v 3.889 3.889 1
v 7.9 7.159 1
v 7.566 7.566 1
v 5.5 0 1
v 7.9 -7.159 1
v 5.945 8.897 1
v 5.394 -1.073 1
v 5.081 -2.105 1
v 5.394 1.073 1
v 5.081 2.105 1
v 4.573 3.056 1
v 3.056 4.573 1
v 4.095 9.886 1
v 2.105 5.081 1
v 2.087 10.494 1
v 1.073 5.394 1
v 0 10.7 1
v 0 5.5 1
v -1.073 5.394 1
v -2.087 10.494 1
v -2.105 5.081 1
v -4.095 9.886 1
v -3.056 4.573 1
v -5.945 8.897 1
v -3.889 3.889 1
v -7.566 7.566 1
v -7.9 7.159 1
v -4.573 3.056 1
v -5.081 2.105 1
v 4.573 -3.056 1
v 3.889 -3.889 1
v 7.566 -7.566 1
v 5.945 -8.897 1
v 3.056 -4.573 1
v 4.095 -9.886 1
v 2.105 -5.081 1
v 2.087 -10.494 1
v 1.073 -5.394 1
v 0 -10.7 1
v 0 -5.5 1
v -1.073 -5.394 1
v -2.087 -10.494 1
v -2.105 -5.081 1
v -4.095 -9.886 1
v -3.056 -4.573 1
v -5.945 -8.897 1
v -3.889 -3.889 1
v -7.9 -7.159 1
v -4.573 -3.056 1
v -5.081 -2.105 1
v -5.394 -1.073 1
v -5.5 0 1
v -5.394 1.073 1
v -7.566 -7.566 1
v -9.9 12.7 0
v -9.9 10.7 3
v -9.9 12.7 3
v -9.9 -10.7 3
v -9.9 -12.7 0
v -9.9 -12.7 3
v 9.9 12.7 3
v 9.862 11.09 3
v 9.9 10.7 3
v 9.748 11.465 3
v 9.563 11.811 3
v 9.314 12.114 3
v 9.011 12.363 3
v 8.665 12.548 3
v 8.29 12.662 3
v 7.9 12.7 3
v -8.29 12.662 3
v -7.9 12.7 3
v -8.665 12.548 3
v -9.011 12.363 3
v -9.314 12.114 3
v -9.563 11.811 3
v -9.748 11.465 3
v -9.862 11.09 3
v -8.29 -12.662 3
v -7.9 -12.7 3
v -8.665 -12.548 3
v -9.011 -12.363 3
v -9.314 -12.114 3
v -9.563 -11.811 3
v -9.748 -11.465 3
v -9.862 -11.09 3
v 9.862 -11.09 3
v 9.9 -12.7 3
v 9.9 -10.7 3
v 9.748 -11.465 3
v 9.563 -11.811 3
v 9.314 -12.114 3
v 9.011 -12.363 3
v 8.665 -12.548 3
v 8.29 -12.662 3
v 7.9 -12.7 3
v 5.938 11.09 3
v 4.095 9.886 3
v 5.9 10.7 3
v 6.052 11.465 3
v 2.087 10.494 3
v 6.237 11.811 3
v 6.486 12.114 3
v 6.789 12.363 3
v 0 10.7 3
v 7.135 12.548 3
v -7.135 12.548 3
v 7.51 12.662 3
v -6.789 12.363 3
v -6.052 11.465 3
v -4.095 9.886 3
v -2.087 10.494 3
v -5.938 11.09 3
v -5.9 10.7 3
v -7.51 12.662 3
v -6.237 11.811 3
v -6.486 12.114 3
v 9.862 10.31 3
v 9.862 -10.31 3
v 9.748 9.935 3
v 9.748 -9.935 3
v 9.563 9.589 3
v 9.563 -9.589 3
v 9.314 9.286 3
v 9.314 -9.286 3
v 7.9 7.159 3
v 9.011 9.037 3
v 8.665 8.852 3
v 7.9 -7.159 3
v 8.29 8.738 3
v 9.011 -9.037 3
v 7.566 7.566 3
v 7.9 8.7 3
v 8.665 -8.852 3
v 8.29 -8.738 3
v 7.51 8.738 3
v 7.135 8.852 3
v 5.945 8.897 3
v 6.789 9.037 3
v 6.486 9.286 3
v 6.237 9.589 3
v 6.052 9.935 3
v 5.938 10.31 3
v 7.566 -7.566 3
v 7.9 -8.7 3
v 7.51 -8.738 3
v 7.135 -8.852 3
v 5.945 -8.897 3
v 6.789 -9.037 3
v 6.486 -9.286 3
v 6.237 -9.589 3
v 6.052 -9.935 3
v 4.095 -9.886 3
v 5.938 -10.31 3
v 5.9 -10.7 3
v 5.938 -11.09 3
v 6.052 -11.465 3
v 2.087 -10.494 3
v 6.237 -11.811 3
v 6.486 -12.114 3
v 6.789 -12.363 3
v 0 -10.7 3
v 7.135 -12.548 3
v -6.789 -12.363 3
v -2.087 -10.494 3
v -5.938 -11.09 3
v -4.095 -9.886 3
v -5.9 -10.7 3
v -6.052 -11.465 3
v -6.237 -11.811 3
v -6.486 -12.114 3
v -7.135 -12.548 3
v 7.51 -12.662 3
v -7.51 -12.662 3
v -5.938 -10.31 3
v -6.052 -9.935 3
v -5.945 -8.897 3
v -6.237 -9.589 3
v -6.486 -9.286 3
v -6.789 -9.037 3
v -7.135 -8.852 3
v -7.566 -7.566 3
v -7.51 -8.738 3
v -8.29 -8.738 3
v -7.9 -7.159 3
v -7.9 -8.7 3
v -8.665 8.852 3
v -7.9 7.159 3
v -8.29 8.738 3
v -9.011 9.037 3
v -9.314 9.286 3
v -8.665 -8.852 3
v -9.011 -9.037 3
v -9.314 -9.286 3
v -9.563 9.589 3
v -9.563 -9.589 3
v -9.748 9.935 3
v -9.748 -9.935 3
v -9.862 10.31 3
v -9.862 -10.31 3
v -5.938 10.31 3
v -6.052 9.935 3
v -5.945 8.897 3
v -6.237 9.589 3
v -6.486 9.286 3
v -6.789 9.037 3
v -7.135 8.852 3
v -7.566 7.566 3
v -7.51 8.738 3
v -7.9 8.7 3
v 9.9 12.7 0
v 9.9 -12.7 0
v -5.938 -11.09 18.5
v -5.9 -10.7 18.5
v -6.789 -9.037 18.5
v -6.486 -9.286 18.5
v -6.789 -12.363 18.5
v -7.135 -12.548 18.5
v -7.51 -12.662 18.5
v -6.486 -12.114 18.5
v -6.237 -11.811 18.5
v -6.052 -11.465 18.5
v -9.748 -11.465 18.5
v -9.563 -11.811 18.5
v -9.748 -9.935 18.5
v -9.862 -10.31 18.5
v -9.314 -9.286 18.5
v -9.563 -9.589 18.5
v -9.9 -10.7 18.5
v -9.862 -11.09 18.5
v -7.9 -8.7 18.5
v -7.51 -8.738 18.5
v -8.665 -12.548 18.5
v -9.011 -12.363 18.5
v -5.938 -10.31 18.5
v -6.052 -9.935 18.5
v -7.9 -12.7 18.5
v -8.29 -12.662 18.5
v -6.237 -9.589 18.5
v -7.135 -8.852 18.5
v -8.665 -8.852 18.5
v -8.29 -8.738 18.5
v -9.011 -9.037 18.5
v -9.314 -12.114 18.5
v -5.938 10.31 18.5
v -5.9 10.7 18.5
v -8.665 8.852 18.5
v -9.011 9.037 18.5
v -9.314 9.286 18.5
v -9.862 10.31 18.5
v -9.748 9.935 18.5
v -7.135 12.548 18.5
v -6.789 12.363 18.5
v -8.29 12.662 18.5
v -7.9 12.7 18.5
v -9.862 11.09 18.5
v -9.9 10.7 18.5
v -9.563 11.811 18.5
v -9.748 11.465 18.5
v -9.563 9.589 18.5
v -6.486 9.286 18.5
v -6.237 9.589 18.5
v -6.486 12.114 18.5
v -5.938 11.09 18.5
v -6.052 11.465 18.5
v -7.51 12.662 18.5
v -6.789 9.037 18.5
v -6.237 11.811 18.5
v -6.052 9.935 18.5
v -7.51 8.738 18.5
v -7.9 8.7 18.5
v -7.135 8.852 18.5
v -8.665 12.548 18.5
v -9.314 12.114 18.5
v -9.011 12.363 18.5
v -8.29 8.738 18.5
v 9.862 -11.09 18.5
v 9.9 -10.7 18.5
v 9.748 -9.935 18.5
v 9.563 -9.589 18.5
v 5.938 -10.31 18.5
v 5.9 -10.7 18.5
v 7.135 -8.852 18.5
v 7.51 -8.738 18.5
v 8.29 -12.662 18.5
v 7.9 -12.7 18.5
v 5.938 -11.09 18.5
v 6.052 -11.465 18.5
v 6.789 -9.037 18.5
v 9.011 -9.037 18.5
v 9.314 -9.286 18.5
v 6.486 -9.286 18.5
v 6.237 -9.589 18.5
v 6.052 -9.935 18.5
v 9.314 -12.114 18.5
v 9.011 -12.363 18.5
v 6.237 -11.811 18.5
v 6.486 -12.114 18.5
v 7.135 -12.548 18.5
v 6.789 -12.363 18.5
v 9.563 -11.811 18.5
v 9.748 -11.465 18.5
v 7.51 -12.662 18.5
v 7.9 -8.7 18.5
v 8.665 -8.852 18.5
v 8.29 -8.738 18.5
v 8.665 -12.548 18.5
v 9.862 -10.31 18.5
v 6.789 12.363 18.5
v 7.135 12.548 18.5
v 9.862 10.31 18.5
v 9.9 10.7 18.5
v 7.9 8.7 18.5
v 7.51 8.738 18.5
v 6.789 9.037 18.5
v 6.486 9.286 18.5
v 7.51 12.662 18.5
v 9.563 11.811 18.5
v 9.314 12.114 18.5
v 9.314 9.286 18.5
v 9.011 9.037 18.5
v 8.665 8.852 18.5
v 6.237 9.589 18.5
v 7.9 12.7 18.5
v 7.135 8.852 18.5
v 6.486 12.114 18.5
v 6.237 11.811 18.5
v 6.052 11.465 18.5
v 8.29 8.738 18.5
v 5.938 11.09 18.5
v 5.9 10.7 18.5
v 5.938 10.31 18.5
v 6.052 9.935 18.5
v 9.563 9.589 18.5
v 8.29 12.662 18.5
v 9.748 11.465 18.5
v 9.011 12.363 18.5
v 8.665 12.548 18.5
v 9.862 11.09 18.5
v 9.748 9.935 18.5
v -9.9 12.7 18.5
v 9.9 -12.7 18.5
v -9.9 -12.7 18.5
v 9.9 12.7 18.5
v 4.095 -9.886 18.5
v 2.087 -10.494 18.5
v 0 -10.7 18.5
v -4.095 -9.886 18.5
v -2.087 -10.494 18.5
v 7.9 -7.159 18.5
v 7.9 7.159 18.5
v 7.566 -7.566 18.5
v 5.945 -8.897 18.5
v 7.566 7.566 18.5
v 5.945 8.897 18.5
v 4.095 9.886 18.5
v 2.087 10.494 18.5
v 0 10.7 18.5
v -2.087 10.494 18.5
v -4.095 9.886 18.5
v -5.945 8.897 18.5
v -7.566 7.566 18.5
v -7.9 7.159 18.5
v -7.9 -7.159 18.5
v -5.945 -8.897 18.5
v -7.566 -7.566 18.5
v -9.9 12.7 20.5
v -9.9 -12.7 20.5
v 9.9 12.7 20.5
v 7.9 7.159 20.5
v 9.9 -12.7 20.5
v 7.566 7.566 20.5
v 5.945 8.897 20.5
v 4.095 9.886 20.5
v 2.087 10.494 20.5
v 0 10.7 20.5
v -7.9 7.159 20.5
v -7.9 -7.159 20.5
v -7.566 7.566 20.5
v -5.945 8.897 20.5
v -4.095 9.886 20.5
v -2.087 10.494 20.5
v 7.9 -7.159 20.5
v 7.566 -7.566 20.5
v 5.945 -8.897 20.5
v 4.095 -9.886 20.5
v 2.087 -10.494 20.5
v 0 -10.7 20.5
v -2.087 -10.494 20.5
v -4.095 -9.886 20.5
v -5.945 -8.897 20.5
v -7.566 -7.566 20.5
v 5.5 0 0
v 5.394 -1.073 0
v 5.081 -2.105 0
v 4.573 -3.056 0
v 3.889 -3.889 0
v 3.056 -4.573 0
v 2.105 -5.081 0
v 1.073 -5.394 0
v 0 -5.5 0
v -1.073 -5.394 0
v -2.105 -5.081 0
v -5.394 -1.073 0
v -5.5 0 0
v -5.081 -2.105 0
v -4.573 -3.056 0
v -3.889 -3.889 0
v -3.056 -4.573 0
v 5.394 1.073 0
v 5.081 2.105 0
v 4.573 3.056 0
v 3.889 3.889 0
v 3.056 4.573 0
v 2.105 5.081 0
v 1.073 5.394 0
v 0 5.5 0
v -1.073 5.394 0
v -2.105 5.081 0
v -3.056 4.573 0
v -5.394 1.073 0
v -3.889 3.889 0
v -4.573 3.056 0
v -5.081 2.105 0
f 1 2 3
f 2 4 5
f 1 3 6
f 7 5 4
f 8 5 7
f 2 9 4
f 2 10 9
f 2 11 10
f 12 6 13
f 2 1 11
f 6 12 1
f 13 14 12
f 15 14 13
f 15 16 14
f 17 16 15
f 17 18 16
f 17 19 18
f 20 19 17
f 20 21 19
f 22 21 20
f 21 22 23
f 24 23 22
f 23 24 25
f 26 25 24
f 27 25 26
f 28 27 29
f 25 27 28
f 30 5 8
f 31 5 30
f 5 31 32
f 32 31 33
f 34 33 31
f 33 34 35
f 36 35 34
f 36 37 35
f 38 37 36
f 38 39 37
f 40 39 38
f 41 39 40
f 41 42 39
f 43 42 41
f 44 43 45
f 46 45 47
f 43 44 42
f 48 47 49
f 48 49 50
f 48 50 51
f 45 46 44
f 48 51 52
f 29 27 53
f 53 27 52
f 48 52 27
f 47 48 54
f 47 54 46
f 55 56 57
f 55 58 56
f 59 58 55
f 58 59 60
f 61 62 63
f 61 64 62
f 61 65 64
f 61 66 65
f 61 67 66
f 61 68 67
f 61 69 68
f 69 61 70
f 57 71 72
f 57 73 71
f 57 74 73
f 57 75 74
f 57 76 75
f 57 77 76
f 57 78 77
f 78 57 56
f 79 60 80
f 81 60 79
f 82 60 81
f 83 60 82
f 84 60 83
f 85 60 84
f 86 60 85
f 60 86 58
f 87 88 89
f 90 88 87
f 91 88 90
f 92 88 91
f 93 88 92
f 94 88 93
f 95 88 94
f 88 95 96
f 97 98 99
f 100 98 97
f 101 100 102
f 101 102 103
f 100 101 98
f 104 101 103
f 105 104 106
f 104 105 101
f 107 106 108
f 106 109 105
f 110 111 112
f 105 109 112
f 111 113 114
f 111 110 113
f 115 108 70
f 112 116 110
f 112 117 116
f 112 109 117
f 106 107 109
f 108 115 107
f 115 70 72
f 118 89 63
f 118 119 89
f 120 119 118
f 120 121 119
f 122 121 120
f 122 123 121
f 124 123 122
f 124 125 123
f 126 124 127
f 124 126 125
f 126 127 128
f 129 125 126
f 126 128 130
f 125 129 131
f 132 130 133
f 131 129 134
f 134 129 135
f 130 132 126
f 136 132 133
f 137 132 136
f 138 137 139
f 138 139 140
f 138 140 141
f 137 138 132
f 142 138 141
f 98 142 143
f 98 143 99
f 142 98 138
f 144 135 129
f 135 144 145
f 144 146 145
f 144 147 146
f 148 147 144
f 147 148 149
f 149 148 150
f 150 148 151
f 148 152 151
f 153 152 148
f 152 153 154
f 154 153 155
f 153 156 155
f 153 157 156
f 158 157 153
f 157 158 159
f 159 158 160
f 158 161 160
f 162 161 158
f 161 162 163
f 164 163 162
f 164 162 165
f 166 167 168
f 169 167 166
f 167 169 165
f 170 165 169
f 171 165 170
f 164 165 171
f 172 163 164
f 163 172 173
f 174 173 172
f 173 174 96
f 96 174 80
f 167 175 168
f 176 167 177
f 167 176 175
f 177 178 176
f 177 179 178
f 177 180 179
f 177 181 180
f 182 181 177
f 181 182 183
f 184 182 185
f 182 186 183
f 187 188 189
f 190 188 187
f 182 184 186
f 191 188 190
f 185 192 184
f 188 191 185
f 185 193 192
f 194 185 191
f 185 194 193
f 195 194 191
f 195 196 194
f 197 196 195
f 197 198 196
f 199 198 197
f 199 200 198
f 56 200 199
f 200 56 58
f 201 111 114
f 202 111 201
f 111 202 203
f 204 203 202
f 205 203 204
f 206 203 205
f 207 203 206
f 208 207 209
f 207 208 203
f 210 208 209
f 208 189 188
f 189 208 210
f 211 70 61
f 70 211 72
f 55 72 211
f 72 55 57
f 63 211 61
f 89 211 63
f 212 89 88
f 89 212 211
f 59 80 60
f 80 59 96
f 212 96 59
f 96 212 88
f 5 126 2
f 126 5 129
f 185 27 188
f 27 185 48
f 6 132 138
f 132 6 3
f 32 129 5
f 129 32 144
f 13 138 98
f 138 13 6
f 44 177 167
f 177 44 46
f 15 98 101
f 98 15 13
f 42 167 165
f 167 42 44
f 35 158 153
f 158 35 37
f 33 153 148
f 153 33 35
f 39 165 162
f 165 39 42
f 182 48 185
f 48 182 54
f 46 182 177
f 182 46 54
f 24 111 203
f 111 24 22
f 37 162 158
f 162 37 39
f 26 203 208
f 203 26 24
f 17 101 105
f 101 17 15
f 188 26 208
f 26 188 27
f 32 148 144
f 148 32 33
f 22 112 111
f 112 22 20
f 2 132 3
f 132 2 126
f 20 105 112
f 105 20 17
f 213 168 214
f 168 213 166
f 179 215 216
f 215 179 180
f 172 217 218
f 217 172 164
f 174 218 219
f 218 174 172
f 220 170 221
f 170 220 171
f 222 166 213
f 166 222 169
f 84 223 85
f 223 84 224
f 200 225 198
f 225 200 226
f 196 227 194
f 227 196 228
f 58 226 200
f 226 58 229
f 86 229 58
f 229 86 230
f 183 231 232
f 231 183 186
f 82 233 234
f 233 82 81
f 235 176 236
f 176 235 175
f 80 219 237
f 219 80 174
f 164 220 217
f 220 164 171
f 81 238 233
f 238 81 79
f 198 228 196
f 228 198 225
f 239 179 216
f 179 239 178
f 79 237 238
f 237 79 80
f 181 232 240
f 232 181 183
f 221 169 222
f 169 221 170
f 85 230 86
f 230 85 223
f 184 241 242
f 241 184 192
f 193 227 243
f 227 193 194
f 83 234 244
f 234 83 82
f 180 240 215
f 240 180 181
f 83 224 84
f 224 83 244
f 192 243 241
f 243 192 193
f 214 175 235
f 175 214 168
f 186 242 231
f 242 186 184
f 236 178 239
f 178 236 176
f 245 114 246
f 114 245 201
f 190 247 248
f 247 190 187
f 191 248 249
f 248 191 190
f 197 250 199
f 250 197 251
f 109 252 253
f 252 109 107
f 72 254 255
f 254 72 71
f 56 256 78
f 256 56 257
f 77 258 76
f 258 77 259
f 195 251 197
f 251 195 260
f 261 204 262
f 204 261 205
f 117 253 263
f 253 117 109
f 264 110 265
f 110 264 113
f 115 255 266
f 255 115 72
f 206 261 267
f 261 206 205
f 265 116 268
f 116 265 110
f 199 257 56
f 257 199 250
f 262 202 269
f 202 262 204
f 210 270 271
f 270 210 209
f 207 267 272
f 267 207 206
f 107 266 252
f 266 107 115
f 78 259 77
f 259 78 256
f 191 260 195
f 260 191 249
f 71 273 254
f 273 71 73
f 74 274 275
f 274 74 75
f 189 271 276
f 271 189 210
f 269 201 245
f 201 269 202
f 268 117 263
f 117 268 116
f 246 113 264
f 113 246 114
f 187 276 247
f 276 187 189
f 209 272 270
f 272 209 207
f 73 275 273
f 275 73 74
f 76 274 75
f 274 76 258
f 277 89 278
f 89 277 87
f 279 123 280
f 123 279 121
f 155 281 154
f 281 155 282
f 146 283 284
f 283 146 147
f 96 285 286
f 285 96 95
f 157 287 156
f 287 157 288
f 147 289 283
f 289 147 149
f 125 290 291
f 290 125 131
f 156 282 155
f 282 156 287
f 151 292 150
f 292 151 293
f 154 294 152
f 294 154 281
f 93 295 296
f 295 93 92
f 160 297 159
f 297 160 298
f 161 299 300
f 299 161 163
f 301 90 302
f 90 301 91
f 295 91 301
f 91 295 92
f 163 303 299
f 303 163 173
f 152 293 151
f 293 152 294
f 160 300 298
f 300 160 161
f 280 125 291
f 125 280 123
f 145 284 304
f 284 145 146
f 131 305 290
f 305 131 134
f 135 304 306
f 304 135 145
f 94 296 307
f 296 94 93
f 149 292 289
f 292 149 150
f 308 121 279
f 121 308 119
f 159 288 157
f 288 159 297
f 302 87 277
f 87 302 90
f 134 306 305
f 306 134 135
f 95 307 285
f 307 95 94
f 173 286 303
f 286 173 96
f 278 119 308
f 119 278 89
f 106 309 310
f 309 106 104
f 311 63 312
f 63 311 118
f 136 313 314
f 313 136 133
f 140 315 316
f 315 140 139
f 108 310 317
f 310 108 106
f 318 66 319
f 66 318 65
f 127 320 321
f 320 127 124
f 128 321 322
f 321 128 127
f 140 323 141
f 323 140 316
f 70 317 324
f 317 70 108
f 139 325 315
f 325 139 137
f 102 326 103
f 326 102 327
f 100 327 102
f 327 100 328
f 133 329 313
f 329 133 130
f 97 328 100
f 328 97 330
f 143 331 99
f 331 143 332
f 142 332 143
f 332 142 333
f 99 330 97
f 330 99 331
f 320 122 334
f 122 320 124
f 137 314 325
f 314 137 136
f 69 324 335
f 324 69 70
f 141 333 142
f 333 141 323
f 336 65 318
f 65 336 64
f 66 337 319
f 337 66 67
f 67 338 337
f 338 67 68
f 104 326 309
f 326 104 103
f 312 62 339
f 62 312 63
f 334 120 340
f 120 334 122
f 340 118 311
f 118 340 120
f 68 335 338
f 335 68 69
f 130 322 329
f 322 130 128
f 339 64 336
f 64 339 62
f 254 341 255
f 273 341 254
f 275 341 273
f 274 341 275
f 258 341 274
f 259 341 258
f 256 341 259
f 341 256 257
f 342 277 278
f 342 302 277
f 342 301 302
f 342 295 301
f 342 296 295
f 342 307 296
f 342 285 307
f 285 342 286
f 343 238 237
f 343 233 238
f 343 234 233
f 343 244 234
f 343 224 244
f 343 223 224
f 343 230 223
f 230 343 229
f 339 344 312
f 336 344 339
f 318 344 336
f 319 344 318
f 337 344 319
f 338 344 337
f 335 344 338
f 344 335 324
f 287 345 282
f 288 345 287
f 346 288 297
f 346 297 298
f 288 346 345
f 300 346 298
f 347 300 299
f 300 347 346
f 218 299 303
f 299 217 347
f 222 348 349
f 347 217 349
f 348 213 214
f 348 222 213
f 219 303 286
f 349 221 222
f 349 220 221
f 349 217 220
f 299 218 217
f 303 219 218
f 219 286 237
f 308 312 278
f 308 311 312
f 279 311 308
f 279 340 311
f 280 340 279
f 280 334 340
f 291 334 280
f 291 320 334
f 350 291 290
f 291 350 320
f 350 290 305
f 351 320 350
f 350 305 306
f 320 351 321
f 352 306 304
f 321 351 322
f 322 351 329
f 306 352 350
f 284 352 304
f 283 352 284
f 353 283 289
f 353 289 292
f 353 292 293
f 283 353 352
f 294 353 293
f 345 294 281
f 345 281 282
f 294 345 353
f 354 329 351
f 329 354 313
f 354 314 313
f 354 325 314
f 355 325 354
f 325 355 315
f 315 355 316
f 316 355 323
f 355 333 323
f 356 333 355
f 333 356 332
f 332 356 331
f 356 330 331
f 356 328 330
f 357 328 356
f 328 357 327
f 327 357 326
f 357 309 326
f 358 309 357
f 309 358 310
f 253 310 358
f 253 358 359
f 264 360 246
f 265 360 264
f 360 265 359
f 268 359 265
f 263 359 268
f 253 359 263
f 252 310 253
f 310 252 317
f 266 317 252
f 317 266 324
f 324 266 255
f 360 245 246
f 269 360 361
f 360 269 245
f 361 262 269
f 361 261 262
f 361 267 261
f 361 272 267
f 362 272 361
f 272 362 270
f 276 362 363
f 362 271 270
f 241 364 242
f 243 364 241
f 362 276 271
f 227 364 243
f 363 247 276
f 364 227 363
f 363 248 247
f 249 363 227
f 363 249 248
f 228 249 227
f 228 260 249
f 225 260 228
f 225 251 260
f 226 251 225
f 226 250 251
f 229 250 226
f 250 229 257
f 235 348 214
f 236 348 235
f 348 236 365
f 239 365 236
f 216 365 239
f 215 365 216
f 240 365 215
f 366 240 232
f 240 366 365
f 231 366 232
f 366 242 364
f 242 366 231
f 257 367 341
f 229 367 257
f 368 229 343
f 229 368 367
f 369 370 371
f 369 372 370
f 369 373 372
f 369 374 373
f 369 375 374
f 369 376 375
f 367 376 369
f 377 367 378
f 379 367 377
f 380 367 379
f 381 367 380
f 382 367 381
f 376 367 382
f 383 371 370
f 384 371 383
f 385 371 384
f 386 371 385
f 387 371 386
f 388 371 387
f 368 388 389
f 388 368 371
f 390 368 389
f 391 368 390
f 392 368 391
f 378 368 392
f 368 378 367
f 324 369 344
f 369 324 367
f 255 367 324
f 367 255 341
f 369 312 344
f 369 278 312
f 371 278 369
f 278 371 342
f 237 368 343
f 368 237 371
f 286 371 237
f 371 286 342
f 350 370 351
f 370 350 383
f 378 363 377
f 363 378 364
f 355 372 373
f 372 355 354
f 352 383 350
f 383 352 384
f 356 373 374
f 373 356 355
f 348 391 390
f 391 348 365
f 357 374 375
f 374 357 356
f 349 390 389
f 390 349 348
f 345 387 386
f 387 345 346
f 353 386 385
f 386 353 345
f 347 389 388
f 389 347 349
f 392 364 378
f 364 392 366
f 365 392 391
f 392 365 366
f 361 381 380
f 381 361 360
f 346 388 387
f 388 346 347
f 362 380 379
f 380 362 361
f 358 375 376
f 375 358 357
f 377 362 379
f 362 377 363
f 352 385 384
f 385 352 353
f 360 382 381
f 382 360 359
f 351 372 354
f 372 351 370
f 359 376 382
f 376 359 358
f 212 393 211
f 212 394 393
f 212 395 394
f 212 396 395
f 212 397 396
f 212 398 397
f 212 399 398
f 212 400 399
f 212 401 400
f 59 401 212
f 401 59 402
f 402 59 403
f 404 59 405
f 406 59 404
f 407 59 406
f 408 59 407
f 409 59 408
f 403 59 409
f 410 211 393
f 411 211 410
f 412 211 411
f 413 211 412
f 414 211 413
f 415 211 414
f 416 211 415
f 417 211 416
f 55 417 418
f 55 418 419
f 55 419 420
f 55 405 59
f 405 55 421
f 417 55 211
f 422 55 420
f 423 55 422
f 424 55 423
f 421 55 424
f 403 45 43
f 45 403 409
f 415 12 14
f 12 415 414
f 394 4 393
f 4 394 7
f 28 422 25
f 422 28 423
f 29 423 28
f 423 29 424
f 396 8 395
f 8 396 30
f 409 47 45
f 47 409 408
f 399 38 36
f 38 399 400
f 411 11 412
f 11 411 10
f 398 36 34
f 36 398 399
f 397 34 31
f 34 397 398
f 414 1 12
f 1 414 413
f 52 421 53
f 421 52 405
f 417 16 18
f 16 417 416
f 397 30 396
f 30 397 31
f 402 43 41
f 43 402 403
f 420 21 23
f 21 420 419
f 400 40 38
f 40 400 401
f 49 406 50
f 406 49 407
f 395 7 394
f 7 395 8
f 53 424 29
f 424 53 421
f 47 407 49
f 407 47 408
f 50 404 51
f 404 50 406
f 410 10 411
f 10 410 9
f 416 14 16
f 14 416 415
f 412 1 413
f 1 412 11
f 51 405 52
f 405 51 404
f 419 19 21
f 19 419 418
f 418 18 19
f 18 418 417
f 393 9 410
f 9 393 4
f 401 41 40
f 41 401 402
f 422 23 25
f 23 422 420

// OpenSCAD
// motor holder
//
// motor has radius of '$mr' with flattened sides at '$mh' and length of '$ml'

// NOTE:  some tolerance added 
$mr = 10.7; // 10 mm radius + shrinkage
$mh = 15.8; // 15 mm height + shrinkage
$ml = 25.0; // 25.0 mm length excluding 'nubs'
$ml2 = 19.5; // 19.5 mm lengh excluding end cap and shaft guide hole 'nub'

$th = 4.0; // overall thickness of plastic around motor
// NOTE:  wall thickness on sides is 1/2 this

// shaft guide hole size
$sh = 3.1;  // 3.1mm radius
$sw = 2;  // 2mm approximate height of guide
$ft = 1;  // 1mm approximate thickness of face
$pr = 2;  // 2mm appx radius of post

// motor shaft extension length
$sl = 10.0; // length of shaft from flat end of motor
$gh = 5.5;  // radius of gear hole

// global accuracy parameters
$fn=32; // number of faces in shape

echo("****************");
echo("face is ",$mh+$th," by ", $mr * 2 + $th," (mm)");

echo("overall height is ", $ft + $ml2, " (mm)");
echo("****************");

module face(hh)
{
  union()
  {
    difference()
    {
      linear_extrude(height=hh)
        square([$mh + $th, $mr * 2 + $th], true);

      translate([0,0,-1])
        linear_extrude(height=hh+2)
          polygon(points=[[-$mh/2,-$mr],[$mh/2,-$mr],[$mh/2,$mr],[-$mh/2,$mr]]);
    }

    difference()
    {
      linear_extrude(height=hh)
        polygon(points=[[-$mh/2,-$mr],[$mh/2,-$mr],[$mh/2,$mr],[-$mh/2,$mr]]);

      translate([0,0,-1])
        linear_extrude(height=hh+2)
          circle($mr);
    }
  }
}


translate([0,0,$ft])
  union()
  {
    color("green")  
      face($sw);

    color("yellow")
      union()
      {
        translate([-$mh/2,-$mr,0])
          linear_extrude(height=$ml2-$sw+1)
            circle($pr);

        translate([-$mh/2,$mr,0])
          linear_extrude(height=$ml2-$sw+1)
            circle($pr);

        translate([$mh/2,-$mr,0])
          linear_extrude(height=$ml2-$sw+1)
            circle($pr);

        translate([$mh/2,$mr,0])
          linear_extrude(height=$ml2-$sw+1)
            circle($pr);
      }

    color("blue")
      translate([0, 0, $ml2-$sw])
        face($sw);
  }

  color("purple")
    difference()
    {
      linear_extrude(height=$ft)
        square([$mh + $th, $mr * 2 + $th], true);
  
      translate([0,0,-1])
        linear_extrude(height=$ft+2)
          circle($gh);
    }
  
